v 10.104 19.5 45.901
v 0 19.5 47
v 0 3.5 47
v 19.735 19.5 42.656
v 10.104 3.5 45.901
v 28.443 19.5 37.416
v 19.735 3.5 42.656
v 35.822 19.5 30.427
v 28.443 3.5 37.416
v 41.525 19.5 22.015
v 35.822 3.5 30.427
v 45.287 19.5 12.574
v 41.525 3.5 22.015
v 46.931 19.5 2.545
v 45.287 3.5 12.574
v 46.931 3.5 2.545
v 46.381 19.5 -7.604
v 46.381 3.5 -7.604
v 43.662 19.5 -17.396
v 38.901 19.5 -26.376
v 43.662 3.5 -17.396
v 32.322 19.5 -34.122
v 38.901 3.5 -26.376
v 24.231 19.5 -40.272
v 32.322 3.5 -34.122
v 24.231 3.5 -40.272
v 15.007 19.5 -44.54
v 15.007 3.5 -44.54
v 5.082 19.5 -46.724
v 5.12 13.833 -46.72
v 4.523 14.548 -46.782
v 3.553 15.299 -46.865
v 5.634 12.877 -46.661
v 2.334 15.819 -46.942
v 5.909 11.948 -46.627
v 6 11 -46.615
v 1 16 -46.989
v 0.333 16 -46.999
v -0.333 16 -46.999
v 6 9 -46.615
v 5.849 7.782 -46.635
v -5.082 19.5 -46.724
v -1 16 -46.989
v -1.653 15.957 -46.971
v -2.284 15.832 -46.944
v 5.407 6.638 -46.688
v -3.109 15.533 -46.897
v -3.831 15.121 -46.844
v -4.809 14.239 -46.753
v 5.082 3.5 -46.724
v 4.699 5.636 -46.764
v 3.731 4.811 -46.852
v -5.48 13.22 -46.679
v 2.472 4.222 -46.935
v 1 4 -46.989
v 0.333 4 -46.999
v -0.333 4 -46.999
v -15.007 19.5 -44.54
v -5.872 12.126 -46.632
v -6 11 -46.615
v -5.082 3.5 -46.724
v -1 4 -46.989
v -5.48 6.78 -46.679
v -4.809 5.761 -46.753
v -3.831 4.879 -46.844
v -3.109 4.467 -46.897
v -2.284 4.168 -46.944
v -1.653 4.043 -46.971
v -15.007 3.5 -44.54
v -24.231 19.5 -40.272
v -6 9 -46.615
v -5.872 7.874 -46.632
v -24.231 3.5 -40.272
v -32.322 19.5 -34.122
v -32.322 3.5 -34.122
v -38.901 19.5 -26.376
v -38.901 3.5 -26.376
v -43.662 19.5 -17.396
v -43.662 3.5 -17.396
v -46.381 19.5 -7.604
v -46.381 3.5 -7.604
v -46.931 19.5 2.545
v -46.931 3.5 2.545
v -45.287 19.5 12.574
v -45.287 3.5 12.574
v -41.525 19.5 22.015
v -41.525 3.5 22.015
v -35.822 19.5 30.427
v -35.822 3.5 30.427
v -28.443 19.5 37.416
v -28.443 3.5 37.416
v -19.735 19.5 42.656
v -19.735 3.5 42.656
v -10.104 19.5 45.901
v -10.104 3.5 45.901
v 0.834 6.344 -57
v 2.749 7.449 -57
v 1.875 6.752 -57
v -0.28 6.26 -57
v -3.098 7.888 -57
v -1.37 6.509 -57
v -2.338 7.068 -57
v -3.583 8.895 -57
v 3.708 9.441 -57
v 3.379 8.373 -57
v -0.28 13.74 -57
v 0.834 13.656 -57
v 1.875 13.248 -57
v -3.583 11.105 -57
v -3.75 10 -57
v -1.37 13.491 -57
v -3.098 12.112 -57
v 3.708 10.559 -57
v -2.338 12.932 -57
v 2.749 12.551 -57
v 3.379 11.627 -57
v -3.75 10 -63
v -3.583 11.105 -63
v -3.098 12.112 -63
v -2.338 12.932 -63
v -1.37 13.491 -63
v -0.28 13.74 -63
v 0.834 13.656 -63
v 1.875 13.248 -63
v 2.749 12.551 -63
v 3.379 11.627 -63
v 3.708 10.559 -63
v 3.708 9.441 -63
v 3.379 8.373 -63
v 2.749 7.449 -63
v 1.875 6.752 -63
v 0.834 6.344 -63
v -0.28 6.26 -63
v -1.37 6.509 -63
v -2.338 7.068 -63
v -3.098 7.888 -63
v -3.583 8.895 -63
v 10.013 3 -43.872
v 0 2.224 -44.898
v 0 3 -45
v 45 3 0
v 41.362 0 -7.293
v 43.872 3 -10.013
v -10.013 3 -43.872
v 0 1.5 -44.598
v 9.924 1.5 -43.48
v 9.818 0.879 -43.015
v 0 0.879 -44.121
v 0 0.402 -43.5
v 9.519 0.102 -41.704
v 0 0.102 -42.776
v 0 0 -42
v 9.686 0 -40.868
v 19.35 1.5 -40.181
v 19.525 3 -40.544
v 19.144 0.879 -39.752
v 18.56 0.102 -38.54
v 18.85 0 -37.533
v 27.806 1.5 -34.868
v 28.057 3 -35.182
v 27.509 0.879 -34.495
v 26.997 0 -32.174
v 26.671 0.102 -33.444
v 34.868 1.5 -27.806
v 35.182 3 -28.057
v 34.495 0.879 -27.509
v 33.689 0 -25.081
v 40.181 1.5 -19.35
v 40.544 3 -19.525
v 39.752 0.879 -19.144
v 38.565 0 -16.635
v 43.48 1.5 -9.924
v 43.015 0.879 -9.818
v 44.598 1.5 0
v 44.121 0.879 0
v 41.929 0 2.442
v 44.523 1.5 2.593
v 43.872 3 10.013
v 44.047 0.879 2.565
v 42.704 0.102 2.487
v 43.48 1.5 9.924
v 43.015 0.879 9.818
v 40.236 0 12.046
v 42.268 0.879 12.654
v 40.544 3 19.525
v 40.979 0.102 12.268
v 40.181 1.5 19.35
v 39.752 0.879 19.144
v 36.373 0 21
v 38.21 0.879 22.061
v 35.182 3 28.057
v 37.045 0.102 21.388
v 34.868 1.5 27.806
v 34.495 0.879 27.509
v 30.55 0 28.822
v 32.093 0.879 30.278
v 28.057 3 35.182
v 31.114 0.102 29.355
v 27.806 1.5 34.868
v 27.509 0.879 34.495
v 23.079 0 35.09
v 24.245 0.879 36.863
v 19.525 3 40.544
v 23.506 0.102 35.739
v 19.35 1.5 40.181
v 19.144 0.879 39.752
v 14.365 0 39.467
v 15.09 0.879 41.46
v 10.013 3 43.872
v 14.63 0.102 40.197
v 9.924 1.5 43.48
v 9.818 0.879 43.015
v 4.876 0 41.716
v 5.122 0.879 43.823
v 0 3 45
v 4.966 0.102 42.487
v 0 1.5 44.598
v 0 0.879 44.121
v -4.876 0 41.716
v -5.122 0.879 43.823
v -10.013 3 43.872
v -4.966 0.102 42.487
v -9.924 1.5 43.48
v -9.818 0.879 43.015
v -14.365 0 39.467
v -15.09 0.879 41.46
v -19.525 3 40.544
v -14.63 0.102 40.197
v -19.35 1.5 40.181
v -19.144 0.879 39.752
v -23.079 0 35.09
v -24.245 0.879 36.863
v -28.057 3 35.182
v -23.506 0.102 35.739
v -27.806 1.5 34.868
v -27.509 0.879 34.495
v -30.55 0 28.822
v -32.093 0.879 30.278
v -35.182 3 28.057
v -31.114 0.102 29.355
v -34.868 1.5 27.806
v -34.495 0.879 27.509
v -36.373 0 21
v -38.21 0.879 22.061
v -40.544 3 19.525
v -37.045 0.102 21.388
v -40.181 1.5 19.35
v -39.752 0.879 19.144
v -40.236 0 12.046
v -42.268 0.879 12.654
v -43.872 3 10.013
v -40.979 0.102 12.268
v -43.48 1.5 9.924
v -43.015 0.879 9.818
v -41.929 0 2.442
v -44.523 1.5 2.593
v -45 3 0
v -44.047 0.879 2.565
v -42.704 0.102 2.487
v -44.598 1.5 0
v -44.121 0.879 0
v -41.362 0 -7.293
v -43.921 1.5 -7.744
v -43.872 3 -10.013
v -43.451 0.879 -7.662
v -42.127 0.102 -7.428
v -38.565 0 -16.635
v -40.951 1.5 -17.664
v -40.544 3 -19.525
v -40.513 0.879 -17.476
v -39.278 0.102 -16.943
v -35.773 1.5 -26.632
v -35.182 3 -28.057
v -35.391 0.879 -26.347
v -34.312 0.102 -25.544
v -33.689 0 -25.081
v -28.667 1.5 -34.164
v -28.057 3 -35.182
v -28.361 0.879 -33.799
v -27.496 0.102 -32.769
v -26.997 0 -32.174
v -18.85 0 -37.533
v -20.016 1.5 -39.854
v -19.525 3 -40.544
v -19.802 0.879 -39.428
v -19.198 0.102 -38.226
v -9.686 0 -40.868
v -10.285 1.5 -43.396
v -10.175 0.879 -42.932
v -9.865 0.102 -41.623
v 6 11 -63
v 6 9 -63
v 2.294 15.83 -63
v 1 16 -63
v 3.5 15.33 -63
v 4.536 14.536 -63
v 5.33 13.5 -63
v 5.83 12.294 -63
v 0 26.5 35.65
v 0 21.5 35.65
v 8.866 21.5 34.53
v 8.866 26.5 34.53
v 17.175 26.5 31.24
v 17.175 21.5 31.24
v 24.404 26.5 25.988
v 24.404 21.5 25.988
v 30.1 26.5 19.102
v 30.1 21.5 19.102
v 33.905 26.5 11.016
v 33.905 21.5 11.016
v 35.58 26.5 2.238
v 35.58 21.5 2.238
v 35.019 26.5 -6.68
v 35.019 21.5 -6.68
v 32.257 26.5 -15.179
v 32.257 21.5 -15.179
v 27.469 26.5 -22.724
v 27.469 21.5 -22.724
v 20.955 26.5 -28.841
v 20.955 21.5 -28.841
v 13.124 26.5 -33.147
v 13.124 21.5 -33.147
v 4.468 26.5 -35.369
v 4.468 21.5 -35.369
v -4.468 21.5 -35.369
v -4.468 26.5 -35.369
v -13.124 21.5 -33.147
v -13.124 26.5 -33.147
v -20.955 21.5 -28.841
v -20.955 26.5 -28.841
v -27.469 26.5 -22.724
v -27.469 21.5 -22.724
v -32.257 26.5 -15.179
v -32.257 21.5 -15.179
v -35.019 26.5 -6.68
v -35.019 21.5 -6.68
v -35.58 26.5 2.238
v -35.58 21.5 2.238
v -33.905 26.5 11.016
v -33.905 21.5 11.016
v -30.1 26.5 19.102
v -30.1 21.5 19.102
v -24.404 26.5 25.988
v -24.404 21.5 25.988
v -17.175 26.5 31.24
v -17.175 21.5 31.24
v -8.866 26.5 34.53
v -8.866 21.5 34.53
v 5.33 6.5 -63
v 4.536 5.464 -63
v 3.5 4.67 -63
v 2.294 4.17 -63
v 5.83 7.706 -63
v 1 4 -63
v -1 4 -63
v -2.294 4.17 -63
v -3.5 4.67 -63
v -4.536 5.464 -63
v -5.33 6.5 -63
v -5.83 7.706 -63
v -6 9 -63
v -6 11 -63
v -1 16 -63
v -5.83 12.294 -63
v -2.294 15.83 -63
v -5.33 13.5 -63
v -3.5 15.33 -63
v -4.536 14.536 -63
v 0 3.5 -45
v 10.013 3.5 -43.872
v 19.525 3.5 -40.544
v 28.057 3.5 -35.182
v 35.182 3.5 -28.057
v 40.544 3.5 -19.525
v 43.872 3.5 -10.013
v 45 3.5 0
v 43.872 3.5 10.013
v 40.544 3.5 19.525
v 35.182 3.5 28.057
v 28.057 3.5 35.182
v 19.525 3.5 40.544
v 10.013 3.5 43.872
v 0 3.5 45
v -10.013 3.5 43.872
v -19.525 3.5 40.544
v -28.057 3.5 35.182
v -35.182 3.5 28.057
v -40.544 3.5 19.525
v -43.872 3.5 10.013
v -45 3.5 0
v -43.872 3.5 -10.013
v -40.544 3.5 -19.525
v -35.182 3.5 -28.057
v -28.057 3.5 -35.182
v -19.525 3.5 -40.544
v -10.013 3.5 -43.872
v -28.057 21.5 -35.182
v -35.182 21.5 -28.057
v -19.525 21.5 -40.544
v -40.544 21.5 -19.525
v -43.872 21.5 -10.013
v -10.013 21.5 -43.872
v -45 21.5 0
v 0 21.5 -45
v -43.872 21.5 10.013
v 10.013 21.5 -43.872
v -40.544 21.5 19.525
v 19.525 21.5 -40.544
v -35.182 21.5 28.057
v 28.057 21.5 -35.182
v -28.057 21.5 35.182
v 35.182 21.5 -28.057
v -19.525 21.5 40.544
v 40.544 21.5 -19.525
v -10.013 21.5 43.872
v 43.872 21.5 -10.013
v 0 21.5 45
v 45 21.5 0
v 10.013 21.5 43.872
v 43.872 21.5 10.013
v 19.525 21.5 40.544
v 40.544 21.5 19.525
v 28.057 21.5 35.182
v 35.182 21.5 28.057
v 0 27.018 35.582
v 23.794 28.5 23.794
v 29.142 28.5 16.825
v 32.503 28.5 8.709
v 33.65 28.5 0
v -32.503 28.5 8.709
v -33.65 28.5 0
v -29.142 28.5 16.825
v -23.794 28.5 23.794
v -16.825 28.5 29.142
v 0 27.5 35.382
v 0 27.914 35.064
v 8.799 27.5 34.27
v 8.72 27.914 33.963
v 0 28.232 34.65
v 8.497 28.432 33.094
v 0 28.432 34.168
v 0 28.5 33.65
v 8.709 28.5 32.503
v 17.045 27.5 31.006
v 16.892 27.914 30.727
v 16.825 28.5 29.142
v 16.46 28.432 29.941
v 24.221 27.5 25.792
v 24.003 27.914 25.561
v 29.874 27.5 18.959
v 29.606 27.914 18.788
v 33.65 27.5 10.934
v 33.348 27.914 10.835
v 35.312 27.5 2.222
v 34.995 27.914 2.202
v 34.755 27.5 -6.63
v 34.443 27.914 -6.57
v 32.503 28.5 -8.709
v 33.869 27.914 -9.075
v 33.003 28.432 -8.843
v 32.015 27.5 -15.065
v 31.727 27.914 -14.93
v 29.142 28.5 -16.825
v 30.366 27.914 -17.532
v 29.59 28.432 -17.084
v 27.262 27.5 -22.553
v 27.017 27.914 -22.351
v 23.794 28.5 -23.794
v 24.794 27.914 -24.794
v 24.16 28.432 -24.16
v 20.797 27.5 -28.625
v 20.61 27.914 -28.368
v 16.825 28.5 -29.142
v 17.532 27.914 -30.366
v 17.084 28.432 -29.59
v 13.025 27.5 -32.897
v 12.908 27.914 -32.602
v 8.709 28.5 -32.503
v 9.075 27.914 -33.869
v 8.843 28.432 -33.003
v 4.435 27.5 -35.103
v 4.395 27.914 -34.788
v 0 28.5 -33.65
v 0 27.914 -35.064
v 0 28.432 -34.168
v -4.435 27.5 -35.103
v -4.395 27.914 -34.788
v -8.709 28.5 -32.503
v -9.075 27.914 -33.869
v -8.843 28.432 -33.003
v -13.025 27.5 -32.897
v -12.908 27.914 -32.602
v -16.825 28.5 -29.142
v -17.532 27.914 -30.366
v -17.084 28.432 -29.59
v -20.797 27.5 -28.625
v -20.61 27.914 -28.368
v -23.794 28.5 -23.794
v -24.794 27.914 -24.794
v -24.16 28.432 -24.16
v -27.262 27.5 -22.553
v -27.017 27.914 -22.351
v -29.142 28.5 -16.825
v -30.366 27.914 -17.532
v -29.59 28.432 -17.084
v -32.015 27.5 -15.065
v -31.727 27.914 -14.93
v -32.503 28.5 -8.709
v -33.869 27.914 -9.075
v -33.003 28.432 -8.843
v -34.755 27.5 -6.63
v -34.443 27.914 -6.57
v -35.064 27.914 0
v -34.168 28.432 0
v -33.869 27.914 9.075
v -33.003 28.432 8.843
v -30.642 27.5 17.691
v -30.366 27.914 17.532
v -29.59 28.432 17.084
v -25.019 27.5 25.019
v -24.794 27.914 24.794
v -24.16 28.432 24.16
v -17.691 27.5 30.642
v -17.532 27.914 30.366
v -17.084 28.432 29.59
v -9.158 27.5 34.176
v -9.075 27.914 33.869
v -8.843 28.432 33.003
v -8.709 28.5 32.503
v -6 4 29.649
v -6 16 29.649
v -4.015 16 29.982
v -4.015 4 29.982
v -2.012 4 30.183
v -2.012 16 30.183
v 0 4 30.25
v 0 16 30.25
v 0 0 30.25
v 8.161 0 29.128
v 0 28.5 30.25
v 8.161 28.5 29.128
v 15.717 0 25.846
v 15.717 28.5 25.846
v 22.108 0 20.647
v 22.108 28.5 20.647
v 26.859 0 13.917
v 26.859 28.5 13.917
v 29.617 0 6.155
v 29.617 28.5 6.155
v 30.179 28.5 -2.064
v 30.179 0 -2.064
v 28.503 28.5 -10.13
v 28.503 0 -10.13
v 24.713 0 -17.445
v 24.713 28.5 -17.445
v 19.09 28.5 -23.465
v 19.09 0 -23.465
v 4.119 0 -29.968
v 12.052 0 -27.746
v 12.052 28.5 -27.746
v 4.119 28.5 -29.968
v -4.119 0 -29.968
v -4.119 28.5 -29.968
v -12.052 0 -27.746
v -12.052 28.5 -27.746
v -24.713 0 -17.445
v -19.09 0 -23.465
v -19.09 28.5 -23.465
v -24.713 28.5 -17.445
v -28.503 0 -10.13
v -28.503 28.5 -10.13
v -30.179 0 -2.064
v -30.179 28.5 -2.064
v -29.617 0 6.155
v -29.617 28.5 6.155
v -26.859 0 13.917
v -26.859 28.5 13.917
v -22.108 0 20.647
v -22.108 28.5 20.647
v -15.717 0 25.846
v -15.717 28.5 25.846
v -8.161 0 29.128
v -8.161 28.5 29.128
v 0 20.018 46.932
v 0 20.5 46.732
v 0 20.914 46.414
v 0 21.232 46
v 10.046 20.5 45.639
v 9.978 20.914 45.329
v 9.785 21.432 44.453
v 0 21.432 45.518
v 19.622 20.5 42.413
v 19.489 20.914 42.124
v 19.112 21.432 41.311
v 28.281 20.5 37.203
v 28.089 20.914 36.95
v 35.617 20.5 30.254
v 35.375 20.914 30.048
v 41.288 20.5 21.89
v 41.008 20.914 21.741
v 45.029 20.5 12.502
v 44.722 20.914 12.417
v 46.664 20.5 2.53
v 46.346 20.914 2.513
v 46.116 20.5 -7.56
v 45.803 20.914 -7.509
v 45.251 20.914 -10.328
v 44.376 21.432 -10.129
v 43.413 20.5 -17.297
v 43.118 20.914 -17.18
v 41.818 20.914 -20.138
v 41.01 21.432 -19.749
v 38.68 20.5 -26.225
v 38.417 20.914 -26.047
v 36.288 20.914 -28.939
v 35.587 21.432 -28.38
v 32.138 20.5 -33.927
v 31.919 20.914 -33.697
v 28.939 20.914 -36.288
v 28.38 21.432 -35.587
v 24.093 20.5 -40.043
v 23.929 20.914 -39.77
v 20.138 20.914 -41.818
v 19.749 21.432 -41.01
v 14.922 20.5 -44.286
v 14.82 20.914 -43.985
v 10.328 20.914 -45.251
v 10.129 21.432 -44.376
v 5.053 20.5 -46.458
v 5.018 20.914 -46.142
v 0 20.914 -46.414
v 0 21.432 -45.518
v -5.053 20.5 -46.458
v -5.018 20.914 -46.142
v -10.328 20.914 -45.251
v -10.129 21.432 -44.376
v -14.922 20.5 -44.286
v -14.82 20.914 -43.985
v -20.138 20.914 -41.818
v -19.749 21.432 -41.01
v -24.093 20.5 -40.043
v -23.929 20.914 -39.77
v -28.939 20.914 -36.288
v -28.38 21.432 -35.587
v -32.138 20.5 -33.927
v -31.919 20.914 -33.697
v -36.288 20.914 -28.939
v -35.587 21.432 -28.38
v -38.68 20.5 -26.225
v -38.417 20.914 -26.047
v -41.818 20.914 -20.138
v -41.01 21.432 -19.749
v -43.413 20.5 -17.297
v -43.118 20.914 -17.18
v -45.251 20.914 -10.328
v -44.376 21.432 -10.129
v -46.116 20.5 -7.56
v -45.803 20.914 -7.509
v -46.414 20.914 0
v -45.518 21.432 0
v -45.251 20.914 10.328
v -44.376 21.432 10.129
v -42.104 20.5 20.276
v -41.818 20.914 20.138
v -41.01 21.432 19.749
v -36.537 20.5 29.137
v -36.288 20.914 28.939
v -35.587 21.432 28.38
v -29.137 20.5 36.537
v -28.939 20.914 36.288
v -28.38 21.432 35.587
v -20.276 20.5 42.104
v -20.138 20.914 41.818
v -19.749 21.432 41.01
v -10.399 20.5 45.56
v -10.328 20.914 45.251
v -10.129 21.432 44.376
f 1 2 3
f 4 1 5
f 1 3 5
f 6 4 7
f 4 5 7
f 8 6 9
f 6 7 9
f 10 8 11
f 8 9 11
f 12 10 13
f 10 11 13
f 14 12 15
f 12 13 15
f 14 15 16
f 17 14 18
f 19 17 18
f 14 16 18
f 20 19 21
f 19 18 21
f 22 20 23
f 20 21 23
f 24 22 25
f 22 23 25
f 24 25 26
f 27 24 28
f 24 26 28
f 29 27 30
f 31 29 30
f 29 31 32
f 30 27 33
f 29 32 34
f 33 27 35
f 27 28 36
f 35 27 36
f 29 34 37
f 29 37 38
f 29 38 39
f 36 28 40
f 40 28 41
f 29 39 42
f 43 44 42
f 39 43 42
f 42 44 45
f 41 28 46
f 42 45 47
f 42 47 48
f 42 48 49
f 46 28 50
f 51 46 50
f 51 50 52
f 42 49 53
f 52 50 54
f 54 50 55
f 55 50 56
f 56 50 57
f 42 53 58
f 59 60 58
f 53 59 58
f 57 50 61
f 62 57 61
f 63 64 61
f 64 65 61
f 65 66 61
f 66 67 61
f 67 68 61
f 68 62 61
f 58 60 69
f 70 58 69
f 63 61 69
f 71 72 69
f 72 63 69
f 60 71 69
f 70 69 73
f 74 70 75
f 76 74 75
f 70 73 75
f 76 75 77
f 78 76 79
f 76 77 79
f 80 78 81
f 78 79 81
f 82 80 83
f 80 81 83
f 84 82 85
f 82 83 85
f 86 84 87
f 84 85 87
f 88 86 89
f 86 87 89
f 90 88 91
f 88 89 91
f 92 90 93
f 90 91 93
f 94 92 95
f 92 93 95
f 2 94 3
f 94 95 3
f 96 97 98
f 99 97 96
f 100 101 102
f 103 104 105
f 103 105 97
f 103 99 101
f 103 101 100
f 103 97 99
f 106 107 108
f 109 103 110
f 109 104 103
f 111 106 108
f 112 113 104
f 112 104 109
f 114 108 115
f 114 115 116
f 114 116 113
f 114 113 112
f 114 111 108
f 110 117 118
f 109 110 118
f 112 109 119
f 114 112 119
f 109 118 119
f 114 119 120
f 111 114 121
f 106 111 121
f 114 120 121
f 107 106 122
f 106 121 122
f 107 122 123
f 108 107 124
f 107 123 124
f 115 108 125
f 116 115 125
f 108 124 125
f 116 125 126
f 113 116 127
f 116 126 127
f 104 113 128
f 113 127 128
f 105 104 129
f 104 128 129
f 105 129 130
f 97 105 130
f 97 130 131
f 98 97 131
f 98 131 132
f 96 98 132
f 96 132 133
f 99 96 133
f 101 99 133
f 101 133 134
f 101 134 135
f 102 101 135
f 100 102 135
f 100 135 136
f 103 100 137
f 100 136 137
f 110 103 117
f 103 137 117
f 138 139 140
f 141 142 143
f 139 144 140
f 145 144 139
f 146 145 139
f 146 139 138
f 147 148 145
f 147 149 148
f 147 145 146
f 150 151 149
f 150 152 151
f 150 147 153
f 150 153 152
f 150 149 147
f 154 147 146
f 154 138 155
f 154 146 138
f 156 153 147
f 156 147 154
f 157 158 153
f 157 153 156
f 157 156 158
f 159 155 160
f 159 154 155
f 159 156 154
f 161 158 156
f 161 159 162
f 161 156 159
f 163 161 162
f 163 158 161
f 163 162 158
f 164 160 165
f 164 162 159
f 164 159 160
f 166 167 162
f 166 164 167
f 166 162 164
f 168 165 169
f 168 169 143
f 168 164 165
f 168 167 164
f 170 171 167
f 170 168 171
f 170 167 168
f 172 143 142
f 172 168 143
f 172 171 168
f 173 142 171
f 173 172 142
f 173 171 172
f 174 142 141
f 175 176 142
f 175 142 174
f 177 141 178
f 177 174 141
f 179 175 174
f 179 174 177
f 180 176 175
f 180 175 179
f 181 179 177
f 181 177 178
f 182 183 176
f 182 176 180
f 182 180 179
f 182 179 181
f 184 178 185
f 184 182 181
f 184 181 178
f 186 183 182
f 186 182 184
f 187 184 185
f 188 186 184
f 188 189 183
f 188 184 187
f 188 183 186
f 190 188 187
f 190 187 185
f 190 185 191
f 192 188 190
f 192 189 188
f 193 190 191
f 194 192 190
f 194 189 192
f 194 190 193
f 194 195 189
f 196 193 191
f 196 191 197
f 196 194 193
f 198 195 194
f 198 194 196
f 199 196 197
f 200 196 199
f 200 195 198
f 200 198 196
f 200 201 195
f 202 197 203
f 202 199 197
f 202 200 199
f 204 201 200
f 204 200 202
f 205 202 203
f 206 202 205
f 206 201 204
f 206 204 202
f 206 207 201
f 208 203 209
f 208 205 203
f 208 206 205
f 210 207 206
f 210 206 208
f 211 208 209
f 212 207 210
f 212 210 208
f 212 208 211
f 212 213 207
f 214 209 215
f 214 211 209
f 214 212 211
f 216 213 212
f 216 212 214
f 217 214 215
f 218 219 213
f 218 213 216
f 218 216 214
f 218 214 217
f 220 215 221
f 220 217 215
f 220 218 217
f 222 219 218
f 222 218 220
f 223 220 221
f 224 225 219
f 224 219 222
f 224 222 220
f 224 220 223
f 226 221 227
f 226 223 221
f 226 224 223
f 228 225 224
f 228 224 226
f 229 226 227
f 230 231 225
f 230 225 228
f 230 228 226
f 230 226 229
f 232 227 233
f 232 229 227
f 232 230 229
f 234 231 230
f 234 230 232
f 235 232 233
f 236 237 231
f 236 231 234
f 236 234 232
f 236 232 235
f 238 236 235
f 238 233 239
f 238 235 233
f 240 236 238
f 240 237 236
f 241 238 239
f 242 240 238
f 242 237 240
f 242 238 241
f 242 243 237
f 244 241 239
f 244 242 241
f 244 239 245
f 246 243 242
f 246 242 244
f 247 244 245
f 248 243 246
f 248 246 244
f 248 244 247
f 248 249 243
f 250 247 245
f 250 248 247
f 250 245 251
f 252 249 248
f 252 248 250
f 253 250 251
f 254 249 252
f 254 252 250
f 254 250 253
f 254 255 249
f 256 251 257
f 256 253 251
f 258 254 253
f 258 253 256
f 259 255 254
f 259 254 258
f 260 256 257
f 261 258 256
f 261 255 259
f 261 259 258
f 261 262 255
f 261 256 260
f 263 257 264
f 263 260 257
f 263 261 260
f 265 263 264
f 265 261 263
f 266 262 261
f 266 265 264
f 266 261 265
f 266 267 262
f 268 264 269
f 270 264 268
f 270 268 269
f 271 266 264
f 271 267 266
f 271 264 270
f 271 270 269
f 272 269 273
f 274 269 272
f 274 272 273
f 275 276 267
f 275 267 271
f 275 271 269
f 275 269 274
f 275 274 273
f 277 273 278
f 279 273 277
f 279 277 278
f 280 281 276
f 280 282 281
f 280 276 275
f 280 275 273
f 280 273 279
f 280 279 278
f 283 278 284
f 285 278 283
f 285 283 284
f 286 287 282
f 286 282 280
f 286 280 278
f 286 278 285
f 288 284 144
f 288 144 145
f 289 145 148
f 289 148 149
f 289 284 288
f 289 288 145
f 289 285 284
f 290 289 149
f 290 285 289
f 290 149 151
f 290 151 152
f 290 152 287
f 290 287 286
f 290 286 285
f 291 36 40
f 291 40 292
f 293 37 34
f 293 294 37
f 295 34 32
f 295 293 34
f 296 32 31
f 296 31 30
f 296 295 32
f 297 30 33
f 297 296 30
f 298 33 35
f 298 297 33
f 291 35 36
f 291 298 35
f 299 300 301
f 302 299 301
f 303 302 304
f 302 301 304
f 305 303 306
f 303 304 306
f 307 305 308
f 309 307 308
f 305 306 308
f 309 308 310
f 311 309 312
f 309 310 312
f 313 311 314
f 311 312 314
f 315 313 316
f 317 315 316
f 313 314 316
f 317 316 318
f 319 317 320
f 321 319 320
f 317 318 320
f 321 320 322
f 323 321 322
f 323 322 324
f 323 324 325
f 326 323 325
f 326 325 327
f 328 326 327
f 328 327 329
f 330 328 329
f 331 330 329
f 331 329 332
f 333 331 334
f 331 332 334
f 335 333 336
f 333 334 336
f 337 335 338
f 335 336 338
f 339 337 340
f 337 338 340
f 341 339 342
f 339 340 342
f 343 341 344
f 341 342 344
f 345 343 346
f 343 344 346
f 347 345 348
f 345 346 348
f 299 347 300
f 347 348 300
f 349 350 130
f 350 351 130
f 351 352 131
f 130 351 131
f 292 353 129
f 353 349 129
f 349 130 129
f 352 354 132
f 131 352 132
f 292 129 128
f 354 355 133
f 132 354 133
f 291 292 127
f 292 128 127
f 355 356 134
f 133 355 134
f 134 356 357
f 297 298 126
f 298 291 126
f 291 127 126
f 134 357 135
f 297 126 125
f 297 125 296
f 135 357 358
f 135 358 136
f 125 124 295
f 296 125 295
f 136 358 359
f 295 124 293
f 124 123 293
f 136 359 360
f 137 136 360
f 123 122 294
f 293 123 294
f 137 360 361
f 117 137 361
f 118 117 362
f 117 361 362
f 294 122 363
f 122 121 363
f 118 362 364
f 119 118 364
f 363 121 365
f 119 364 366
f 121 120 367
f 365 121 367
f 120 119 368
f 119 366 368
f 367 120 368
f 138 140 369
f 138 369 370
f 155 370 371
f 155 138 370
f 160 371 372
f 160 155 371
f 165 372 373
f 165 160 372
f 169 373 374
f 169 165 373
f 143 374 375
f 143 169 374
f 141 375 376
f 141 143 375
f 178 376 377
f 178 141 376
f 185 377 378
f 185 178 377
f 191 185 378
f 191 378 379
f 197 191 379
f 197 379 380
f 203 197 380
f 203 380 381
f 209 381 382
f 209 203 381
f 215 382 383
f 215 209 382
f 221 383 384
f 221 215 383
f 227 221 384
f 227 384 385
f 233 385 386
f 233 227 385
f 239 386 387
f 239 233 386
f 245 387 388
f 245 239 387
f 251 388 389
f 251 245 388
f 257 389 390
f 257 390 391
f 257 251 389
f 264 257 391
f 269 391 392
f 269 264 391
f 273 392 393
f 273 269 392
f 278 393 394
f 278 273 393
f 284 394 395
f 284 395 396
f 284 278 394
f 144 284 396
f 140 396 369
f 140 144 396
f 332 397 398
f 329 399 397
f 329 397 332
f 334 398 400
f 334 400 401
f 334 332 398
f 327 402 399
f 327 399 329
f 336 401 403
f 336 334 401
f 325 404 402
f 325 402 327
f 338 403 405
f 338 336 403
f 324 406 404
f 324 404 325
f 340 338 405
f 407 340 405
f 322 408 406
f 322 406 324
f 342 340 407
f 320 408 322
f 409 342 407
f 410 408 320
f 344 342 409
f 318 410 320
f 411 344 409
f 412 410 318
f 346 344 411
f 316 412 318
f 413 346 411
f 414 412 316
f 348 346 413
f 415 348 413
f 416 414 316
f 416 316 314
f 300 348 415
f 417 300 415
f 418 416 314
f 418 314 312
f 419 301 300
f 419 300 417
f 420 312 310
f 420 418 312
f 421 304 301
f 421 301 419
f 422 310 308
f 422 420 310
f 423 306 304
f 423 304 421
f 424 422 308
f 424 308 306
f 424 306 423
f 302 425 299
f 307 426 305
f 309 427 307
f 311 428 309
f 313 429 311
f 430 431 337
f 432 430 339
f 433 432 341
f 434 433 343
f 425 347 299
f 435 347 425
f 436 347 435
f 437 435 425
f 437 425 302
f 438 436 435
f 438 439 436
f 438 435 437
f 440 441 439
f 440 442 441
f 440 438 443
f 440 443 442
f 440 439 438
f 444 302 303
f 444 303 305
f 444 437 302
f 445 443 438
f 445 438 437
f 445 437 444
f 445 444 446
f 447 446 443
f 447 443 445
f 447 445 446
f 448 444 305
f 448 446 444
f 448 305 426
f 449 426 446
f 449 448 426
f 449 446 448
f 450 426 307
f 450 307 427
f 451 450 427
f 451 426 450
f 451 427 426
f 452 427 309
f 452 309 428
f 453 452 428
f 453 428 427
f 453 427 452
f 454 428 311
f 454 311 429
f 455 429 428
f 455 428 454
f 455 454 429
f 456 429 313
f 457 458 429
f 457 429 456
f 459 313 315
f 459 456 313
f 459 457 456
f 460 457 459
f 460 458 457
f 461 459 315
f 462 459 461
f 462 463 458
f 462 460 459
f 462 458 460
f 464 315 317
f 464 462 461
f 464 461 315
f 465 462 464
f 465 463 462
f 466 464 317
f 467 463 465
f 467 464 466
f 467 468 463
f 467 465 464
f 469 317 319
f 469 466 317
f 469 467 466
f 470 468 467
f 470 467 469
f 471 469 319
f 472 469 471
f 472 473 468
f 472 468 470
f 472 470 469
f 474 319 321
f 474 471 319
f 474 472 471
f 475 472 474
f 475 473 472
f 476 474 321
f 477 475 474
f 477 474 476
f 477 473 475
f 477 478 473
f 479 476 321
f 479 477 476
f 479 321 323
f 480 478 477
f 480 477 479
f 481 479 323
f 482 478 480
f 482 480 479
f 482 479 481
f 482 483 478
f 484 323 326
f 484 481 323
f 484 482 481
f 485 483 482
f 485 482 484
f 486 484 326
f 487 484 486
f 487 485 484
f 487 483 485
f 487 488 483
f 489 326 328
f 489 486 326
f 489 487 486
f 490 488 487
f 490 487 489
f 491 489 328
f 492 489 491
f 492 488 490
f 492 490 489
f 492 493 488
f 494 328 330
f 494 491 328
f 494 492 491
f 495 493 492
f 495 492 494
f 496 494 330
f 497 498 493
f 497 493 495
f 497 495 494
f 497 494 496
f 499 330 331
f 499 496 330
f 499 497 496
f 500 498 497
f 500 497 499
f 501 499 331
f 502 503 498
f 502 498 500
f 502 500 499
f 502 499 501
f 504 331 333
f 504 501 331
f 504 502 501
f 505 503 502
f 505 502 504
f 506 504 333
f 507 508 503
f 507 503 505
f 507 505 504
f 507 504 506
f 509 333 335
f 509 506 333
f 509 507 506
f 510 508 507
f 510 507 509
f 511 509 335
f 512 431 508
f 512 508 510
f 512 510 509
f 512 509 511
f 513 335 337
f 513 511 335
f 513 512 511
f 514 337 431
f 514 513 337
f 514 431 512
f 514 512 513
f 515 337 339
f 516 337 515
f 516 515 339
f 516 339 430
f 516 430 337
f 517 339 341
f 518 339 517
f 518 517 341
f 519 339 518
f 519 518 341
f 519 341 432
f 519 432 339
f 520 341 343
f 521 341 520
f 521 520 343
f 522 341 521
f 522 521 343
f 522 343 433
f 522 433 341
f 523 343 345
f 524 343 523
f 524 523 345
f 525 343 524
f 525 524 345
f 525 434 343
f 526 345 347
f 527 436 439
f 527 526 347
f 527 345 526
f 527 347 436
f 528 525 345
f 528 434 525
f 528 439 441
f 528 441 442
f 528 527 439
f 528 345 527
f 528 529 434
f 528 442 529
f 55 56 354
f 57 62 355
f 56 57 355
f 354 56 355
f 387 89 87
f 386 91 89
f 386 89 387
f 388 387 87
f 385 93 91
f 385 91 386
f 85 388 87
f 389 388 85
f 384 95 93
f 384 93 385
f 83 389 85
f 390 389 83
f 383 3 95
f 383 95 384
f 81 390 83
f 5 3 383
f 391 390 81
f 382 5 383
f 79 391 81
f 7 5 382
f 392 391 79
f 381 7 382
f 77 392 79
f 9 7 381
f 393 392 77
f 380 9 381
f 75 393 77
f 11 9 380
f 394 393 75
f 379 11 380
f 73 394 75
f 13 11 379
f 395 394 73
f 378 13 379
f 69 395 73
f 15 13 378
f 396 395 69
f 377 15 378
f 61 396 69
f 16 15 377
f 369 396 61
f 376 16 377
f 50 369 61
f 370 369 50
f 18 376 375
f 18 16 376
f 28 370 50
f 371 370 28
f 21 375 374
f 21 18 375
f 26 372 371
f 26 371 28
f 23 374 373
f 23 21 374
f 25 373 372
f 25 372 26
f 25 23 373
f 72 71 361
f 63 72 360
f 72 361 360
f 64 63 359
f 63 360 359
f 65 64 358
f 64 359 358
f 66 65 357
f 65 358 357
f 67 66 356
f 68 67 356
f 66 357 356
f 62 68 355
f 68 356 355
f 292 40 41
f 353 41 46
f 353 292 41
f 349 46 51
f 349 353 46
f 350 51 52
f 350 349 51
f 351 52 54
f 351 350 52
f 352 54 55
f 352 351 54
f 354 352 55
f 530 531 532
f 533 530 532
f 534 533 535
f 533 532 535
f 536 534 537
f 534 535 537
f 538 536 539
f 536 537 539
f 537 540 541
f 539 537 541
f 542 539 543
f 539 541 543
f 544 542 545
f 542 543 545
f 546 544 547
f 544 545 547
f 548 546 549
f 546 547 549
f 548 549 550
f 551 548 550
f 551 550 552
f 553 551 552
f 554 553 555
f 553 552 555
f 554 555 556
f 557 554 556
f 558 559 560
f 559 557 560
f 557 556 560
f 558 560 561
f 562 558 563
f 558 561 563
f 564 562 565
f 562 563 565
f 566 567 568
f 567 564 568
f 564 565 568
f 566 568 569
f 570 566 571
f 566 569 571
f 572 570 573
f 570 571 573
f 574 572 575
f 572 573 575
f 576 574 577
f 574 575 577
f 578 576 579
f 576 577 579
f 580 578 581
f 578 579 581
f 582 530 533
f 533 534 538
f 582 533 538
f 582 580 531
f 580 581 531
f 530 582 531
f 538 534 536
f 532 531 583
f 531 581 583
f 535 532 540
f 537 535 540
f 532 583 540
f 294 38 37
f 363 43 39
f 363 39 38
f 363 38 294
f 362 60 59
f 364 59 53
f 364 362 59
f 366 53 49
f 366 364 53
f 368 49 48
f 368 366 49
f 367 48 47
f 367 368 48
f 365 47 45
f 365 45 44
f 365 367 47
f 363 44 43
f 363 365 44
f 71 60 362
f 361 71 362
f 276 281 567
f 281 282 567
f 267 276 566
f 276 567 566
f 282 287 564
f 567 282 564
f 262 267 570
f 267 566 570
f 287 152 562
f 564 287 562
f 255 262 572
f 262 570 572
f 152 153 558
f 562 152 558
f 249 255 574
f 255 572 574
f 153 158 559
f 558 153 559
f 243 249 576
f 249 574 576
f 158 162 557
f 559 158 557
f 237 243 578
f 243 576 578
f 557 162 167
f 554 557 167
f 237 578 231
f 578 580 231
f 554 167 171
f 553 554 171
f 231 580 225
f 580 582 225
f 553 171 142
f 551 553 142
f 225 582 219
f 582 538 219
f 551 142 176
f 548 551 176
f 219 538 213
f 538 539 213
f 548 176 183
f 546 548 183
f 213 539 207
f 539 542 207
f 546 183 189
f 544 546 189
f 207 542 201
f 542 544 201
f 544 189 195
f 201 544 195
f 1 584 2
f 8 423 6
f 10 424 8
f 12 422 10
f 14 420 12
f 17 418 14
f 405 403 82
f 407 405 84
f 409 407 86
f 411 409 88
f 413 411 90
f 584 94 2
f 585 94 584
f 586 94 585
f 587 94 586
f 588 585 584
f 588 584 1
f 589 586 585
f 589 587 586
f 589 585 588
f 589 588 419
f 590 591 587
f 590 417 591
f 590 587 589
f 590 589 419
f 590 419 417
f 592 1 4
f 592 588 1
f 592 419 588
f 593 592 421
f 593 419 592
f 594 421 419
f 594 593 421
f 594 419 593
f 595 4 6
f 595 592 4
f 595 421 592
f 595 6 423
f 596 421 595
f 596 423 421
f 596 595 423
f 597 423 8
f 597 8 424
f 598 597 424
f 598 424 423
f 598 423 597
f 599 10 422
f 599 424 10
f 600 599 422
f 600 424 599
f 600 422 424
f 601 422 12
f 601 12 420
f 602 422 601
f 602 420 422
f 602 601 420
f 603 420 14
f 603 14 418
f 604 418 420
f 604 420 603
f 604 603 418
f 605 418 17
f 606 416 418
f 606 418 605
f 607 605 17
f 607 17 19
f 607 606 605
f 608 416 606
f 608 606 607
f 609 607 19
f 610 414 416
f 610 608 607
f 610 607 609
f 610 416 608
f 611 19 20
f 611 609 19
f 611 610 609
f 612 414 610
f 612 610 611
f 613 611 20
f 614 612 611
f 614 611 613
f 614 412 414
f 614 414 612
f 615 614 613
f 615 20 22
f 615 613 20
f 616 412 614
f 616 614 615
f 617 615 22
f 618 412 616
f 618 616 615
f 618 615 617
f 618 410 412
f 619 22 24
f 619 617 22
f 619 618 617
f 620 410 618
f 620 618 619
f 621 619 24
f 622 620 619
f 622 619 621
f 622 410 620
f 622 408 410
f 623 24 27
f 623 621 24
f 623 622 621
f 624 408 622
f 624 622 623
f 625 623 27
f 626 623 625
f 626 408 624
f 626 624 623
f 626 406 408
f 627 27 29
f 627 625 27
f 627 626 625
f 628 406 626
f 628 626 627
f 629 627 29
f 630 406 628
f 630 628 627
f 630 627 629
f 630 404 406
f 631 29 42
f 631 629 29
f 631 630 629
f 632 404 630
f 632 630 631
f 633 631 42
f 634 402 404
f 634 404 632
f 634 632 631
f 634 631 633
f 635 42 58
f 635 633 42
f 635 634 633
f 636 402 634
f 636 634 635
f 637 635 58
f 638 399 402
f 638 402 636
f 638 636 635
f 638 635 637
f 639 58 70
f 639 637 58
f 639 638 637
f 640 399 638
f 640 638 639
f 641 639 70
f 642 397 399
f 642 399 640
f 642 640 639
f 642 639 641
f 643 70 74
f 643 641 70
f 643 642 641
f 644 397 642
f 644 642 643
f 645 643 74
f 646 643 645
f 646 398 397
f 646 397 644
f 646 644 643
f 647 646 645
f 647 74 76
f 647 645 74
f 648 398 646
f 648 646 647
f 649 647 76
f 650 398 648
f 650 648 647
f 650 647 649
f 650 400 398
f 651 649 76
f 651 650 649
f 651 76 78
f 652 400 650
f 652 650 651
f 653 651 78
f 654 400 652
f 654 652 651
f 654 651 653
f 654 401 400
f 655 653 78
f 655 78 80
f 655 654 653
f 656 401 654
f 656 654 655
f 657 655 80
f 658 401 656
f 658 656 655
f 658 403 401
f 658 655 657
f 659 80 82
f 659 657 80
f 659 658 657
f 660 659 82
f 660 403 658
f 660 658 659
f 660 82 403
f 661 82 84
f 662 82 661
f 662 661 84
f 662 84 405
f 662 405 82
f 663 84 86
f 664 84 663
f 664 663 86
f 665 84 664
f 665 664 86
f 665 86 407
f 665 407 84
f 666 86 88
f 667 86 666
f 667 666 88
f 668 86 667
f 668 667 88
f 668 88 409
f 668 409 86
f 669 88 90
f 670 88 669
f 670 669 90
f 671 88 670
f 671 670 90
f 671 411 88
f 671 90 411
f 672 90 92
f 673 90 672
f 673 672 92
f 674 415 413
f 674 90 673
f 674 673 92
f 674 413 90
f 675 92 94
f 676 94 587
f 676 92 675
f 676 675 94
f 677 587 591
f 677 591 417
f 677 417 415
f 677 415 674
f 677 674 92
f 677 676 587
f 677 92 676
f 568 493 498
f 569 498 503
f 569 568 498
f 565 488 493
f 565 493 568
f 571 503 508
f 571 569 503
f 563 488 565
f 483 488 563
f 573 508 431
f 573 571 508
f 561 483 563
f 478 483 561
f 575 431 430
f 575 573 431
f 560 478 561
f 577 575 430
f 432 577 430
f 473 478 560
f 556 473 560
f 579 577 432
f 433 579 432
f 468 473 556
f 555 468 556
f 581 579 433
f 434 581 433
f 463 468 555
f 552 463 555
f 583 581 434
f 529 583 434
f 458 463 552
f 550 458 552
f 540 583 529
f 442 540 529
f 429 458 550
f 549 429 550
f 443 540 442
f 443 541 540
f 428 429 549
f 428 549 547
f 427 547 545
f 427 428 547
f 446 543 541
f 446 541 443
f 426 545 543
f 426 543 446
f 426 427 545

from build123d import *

# Parameters (mm, degrees)
SKETCH_1_R           = 47
EXTRUDE_1_DEPTH      = 21.5
SKETCH_2_R           = 35.65
EXTRUDE_2_DEPTH      = 7
SKETCH_3_R           = 30.25
CUT_EXTRUDE_1_DEPTH  = 73.320467366
FILLET_1_R           = 2
EXTRUDE_3_DEPTH      = 6
EXTRUDE_3_DEPTH_BACK = 6
SKETCH_4_W           = 103.611126825
SKETCH_4_H           = 12
CUT_EXTRUDE_3_DEPTH  = 81.212218521
FILLET_2_R           = 5
SKETCH_5_R           = 3.75
CUT_EXTRUDE_2_DEPTH  = 6
SKETCH_7_R           = 47
SKETCH_7_R_2         = 45
CUT_EXTRUDE_4_DEPTH  = 3.5
FILLET_3_R           = 3


with BuildPart() as part:
    # 草图1 → 凸台-拉伸1 (new body)
    with BuildSketch(Plane(origin=(0, 0, 0), x_dir=(1, 0, 0), z_dir=(0, 1, 0))):
        Circle(SKETCH_1_R)
    extrude(amount=EXTRUDE_1_DEPTH)

    # 草图2 → 凸台-拉伸2 (add)
    with BuildSketch(Plane(origin=(0, 21.5, 0), x_dir=(1, 0, 0), z_dir=(0, 1, 0))):
        Circle(SKETCH_2_R)
    extrude(amount=EXTRUDE_2_DEPTH)

    # 草图3 → 切除-拉伸1 (cut, through all)
    with BuildSketch(Plane(origin=(0, 28.5, 0), x_dir=(1, 0, 0), z_dir=(0, 1, 0))):
        Circle(SKETCH_3_R)
    extrude(amount=-CUT_EXTRUDE_1_DEPTH, mode=Mode.SUBTRACT)

    # 圆角1
    fillet_1_edges = [part.edges().sort_by_distance(p)[0] for p in [
        (-35.65, 28.5, 0),
        (-47, 21.5, 0),
    ]]
    fillet(fillet_1_edges, radius=FILLET_1_R)

    # 草图4 → 凸台-拉伸3 (add, two sides: drawn at the far end of the back side and taken through both)
    with BuildSketch(Plane(origin=(0, 0, 0), x_dir=(0, 0, -1), z_dir=(1, 0, 0)).offset(-EXTRUDE_3_DEPTH_BACK)):
        with Locations((11.194436588, 10)):
            Rectangle(SKETCH_4_W, SKETCH_4_H)
    extrude(amount=EXTRUDE_3_DEPTH + EXTRUDE_3_DEPTH_BACK)

    # 草图6 → 切除-拉伸3 (cut, through all)
    with BuildSketch(Plane(origin=(0, 16, 0), x_dir=(1, 0, 0), z_dir=(0, 1, 0))):
        with BuildLine():
            Line((-6, 29.648988178), (-6, -29.648988178))
            ThreePointArc((-6, -29.648988178), (0, -30.25), (6, -29.648988178))
            Line((6, -29.648988178), (6, 29.648988178))
            ThreePointArc((6, 29.648988178), (0, 30.25), (-6, 29.648988178))
        make_face()
    extrude(amount=-CUT_EXTRUDE_3_DEPTH, mode=Mode.SUBTRACT)

    # 圆角2
    fillet_2_edges = [part.edges().sort_by_distance(p)[0] for p in [
        (-6, 16, -54.807724042),
        (-6, 4, -54.807724042),
        (6, 4, -54.807724042),
        (6, 16, -54.807724042),
    ]]
    fillet(fillet_2_edges, radius=FILLET_2_R)

    # 草图5 → 切除-拉伸2 (cut)
    with BuildSketch(Plane(origin=(0, 0, -63), x_dir=(-1, 0, 0), z_dir=(0, 0, -1))):
        with Locations((0, 10)):
            Circle(SKETCH_5_R)
    extrude(amount=-CUT_EXTRUDE_2_DEPTH, mode=Mode.SUBTRACT)

    # 草图7 → 切除-拉伸4 (cut)
    with BuildSketch(Plane.XZ):
        Circle(SKETCH_7_R)
        Circle(SKETCH_7_R_2, mode=Mode.SUBTRACT)
    extrude(amount=-CUT_EXTRUDE_4_DEPTH, mode=Mode.SUBTRACT)

    # 圆角3
    fillet_3_edges = [part.edges().sort_by_distance(p)[0] for p in [
        (-45, 0, 0),
    ]]
    fillet(fillet_3_edges, radius=FILLET_3_R)


solid = part.part
